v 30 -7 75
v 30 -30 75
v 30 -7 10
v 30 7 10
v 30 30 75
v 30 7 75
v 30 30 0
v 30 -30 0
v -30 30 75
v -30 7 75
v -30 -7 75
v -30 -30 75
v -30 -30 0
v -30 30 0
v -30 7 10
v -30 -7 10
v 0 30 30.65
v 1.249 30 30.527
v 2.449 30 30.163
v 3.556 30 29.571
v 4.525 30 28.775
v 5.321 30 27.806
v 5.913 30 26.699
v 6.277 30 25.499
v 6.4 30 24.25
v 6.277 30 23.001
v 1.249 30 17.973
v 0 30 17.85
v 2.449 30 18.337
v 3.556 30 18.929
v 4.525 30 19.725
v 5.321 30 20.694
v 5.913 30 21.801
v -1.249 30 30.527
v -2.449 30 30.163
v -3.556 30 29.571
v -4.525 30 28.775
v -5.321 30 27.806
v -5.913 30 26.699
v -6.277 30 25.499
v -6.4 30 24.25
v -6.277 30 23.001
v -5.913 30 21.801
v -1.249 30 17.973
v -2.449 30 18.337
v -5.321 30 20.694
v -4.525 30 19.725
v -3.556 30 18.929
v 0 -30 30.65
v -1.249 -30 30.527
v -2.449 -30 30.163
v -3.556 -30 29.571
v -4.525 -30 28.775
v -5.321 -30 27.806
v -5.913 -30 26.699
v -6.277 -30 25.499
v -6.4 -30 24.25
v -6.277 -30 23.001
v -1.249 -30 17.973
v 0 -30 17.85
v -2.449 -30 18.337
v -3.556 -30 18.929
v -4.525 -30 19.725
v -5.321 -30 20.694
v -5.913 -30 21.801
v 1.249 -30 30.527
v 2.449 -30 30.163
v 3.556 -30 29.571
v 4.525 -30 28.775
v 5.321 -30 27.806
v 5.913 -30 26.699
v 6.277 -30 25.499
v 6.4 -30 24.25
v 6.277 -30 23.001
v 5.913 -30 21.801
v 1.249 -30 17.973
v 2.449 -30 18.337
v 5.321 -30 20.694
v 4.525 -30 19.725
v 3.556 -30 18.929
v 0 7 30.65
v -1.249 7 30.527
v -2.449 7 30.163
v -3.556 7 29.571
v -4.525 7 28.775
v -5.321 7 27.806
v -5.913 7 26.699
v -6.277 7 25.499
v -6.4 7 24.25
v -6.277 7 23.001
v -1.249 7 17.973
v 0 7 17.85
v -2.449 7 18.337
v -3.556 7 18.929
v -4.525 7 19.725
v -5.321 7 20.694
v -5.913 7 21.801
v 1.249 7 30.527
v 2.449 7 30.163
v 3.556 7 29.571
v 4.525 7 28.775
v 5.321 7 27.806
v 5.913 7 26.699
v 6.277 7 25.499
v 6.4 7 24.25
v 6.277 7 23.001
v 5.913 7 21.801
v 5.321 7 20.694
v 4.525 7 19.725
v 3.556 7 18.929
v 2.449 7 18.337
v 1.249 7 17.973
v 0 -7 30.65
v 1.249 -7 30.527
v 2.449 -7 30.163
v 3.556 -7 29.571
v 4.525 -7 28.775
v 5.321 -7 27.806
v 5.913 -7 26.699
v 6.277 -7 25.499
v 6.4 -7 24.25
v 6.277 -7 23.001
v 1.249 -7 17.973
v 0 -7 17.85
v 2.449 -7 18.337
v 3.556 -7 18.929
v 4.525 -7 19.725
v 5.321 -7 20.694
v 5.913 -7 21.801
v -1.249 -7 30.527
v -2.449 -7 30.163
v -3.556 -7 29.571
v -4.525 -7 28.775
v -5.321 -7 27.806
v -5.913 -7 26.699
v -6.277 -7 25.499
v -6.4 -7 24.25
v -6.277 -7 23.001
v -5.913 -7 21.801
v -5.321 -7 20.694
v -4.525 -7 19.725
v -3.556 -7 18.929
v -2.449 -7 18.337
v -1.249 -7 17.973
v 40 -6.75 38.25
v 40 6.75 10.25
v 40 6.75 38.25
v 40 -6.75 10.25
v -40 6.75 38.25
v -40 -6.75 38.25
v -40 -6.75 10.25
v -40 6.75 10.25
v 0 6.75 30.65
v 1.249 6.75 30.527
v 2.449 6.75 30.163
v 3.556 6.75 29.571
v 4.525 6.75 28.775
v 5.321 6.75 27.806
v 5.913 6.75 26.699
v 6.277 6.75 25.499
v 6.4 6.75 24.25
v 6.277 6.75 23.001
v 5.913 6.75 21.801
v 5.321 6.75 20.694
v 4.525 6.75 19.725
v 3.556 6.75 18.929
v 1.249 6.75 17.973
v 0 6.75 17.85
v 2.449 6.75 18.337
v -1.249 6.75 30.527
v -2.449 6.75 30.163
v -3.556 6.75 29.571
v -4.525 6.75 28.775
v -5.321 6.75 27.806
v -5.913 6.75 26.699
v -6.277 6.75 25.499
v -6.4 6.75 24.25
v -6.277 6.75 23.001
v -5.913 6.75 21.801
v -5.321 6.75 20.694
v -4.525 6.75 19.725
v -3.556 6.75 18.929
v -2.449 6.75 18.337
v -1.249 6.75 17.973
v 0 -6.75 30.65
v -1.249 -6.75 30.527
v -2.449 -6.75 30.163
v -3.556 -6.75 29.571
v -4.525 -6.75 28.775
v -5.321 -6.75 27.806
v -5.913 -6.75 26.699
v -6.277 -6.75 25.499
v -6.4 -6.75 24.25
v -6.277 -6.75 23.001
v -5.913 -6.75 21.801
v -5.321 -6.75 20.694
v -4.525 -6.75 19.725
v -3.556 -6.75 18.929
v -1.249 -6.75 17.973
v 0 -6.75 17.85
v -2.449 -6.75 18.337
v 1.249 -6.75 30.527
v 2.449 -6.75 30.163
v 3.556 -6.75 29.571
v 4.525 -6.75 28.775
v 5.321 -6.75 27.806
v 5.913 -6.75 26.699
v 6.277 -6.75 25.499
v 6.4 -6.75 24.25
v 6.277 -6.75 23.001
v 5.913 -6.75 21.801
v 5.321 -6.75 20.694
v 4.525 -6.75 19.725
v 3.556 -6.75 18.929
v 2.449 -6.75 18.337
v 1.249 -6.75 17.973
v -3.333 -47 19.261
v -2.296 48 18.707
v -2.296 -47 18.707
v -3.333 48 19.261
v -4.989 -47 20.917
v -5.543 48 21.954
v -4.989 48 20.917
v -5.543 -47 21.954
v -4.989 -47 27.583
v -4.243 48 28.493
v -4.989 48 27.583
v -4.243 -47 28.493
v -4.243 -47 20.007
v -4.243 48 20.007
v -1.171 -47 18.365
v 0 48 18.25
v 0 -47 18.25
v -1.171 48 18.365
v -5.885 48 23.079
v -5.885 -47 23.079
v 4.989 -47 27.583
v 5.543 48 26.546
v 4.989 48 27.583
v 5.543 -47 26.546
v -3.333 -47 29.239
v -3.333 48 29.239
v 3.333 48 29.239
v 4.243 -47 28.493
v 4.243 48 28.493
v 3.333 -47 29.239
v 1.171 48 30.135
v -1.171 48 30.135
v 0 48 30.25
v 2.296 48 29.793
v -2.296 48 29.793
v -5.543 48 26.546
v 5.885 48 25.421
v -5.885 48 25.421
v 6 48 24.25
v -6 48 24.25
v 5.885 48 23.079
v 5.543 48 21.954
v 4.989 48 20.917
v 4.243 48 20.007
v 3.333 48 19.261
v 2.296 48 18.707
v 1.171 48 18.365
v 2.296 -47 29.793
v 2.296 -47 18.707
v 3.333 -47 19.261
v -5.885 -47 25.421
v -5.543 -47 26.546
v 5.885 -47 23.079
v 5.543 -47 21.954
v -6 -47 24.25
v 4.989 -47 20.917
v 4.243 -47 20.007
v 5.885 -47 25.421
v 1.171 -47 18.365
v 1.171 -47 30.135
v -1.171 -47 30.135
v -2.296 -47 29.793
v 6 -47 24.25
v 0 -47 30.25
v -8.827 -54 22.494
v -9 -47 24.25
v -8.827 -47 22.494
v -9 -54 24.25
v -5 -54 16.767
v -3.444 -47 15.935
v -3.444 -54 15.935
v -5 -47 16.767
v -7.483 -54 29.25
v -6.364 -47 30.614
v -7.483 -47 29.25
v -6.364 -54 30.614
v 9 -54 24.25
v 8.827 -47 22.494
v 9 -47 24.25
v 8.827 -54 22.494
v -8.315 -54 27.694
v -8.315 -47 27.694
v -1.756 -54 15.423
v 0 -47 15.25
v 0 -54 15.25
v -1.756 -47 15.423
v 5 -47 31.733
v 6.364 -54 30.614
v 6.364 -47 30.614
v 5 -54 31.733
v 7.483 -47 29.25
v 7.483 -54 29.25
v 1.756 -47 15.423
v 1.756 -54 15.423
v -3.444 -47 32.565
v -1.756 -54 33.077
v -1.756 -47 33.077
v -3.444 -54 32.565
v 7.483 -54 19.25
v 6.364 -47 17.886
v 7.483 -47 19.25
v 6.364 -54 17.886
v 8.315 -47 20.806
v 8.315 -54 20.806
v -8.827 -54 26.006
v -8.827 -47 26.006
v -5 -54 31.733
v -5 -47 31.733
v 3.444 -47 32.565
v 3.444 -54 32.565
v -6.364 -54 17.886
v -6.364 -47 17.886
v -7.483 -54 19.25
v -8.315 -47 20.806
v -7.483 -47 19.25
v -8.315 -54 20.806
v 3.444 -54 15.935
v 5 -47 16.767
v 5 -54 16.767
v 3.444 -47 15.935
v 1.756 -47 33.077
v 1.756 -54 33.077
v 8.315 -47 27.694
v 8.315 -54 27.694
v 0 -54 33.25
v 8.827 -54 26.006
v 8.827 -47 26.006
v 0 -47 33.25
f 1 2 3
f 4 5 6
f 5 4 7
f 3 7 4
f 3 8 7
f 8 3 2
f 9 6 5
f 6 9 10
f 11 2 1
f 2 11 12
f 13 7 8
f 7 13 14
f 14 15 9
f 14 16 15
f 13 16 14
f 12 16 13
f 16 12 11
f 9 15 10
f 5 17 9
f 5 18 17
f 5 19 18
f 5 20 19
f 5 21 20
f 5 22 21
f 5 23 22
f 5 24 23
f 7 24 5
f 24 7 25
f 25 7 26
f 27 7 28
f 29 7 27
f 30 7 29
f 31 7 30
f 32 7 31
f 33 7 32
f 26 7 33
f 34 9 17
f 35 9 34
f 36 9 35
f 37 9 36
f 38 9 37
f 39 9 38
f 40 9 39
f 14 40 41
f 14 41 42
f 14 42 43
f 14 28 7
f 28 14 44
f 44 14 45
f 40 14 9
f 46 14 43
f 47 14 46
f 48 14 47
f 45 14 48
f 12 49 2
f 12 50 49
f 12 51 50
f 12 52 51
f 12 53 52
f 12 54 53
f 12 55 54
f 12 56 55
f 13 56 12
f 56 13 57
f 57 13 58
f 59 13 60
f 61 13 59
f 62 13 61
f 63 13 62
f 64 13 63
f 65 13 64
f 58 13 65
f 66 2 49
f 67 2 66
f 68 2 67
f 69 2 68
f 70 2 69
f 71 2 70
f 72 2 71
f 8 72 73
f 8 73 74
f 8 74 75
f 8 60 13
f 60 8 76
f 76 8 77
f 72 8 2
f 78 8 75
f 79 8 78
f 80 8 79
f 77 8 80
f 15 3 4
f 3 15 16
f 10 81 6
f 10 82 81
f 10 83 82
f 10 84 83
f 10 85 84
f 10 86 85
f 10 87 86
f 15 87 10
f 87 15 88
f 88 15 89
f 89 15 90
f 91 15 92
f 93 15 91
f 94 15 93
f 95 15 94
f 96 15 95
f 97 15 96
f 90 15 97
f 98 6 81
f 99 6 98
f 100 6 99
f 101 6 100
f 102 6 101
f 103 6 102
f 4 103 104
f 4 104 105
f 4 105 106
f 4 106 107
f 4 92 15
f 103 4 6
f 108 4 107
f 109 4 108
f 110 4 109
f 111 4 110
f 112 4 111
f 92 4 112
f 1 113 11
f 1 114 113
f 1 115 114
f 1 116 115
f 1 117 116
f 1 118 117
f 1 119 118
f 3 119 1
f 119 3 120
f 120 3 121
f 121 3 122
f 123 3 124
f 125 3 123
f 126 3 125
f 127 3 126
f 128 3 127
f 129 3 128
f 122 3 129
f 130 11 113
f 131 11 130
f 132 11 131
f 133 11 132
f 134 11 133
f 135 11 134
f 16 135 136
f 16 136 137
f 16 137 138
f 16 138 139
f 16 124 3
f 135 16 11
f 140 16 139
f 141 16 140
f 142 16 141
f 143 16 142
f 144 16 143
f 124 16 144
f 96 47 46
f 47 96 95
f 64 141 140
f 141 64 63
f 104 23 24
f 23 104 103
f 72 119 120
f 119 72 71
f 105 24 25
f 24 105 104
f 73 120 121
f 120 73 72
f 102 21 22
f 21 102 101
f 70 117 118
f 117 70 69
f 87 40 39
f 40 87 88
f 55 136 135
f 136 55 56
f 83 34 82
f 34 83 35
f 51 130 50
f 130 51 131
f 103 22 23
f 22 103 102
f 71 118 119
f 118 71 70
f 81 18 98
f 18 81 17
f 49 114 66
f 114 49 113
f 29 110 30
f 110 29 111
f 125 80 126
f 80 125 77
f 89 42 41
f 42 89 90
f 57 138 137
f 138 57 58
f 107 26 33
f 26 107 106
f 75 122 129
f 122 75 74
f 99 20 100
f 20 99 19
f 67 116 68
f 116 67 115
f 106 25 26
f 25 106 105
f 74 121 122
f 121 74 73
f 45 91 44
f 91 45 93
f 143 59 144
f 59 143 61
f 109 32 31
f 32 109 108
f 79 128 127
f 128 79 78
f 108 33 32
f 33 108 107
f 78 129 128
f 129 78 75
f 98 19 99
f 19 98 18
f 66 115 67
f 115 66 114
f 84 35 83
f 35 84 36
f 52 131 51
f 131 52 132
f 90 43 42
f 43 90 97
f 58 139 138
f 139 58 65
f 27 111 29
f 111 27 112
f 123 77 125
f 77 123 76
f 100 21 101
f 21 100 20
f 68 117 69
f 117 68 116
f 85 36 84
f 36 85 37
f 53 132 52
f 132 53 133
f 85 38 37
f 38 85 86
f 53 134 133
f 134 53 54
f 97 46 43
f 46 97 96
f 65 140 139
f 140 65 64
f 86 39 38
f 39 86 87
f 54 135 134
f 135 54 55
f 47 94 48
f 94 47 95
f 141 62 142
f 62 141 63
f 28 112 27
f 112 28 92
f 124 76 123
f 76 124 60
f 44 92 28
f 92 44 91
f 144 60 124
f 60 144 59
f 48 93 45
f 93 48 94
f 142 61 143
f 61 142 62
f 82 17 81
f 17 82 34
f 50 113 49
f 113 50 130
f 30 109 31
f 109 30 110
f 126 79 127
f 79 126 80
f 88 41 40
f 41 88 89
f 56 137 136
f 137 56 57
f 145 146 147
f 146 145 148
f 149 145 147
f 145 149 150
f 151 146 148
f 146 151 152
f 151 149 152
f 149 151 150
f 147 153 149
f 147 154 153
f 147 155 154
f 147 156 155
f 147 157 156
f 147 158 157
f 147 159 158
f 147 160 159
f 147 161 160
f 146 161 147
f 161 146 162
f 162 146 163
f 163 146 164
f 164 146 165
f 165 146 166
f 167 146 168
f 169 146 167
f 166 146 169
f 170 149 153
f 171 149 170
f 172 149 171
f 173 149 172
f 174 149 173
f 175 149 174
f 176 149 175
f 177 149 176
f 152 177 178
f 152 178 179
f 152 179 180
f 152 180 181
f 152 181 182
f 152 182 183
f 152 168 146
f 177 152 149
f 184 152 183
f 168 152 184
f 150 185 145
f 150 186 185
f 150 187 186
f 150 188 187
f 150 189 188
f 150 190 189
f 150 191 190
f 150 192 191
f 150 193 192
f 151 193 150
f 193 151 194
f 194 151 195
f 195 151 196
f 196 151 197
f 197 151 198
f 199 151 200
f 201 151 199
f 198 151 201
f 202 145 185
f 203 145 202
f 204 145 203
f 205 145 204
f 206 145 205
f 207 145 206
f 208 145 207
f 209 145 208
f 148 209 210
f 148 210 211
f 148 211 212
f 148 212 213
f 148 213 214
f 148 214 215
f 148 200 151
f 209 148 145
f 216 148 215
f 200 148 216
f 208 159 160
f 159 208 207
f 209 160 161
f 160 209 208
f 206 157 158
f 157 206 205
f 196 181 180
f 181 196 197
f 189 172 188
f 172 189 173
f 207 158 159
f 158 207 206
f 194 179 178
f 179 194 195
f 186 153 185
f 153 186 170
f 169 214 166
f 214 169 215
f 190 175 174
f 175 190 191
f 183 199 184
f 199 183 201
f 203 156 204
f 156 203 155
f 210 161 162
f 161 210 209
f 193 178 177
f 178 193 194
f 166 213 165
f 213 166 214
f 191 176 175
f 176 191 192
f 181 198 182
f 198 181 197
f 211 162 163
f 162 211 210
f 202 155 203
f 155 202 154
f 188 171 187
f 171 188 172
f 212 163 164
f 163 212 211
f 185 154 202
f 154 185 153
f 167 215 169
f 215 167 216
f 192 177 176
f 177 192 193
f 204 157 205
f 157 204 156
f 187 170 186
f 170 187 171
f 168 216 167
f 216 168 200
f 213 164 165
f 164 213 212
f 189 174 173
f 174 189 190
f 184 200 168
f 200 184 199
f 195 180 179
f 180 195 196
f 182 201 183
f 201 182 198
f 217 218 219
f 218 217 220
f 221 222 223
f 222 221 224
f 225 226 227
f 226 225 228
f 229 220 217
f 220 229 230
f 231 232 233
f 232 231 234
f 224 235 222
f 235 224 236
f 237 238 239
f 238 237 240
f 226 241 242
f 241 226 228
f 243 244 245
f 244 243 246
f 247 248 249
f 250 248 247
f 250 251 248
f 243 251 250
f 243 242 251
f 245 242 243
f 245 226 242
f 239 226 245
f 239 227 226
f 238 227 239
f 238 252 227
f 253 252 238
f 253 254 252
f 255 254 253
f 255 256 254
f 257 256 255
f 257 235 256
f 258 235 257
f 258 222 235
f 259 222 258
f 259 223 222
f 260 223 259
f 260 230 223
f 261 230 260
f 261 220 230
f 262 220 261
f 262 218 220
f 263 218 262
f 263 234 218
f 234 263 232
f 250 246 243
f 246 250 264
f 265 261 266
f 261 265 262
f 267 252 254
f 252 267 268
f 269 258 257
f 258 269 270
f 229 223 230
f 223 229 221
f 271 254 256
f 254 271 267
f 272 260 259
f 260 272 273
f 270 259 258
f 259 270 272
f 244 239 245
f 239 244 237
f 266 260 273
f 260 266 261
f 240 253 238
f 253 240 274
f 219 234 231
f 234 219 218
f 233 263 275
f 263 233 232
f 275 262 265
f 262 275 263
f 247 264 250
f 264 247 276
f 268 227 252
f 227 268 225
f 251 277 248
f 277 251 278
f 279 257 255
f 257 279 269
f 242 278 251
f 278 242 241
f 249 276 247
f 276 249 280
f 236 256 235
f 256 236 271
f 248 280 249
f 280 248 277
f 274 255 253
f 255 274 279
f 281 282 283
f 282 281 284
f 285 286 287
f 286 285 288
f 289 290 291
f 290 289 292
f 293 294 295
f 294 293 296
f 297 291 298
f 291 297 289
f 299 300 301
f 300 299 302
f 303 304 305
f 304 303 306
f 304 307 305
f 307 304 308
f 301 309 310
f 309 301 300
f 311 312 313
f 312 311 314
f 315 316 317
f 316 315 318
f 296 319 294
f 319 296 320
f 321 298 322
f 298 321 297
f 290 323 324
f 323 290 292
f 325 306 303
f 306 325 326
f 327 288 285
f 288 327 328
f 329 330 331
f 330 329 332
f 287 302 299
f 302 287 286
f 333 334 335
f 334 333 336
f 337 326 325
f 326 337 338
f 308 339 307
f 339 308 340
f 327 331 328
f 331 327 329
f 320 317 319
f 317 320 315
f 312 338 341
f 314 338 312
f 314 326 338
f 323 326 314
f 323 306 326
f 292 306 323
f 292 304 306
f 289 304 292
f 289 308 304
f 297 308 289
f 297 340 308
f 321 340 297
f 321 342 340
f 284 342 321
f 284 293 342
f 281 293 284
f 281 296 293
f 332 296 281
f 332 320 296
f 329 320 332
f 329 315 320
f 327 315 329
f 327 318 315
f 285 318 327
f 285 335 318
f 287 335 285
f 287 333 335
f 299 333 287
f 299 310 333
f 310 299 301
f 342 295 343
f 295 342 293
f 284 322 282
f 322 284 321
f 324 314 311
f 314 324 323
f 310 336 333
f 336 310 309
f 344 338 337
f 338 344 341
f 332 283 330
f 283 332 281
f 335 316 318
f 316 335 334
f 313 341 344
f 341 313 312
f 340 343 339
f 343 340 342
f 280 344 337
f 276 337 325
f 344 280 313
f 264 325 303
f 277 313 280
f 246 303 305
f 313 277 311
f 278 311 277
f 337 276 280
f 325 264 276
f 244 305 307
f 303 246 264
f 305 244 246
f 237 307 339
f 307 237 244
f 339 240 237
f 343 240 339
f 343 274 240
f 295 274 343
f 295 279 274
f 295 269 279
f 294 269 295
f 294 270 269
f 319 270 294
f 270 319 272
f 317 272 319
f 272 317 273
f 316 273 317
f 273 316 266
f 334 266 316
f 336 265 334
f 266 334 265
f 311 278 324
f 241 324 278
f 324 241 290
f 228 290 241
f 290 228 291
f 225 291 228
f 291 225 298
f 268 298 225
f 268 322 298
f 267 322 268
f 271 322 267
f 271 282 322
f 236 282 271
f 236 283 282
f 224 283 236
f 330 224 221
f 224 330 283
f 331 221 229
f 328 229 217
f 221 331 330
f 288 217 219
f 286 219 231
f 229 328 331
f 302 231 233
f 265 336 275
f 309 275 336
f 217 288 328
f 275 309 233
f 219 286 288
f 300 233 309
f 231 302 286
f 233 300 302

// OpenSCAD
$fn = 32;

// ------------------------------------------------------------------------
// Clevis joint: 60 mm clevis, pin d12
// Every part is its own module, assembly() places them once.
// ------------------------------------------------------------------------

// --- part 1 ---
module clevis() {
  difference() {
    translate([-30, -30, 0]) cube([60, 60, 75]);
    translate([-31, -7, 10]) cube([62, 14, 66]);
    translate([0, 0, 24.25]) rotate([90, 0, 0]) cylinder(h = 62, d = 12.8, center = true);
  }
}

// --- part 2 ---
module eye() {
  difference() {
    translate([-40, -6.75, 0]) cube([80, 13.5, 28]);
    translate([0, 0, 14]) rotate([90, 0, 0]) cylinder(h = 15.5, d = 12.8, center = true);
  }
}

// --- part 3 ---
module pin() {
  rotate([0, 90, 0]) cylinder(h = 96, d = 12, center = true);
  translate([-54, 0, 0]) rotate([0, 90, 0]) cylinder(h = 7, d = 18);
}

// --- assembly ---
module assembly() {
  translate([0, 0, 0]) rotate([0, 0, 0]) clevis();
  translate([0, 0, 10.25]) rotate([0, 0, 0]) eye();
  translate([0, 0, 24.25]) rotate([0, 0, 90]) pin();
}

assembly();
